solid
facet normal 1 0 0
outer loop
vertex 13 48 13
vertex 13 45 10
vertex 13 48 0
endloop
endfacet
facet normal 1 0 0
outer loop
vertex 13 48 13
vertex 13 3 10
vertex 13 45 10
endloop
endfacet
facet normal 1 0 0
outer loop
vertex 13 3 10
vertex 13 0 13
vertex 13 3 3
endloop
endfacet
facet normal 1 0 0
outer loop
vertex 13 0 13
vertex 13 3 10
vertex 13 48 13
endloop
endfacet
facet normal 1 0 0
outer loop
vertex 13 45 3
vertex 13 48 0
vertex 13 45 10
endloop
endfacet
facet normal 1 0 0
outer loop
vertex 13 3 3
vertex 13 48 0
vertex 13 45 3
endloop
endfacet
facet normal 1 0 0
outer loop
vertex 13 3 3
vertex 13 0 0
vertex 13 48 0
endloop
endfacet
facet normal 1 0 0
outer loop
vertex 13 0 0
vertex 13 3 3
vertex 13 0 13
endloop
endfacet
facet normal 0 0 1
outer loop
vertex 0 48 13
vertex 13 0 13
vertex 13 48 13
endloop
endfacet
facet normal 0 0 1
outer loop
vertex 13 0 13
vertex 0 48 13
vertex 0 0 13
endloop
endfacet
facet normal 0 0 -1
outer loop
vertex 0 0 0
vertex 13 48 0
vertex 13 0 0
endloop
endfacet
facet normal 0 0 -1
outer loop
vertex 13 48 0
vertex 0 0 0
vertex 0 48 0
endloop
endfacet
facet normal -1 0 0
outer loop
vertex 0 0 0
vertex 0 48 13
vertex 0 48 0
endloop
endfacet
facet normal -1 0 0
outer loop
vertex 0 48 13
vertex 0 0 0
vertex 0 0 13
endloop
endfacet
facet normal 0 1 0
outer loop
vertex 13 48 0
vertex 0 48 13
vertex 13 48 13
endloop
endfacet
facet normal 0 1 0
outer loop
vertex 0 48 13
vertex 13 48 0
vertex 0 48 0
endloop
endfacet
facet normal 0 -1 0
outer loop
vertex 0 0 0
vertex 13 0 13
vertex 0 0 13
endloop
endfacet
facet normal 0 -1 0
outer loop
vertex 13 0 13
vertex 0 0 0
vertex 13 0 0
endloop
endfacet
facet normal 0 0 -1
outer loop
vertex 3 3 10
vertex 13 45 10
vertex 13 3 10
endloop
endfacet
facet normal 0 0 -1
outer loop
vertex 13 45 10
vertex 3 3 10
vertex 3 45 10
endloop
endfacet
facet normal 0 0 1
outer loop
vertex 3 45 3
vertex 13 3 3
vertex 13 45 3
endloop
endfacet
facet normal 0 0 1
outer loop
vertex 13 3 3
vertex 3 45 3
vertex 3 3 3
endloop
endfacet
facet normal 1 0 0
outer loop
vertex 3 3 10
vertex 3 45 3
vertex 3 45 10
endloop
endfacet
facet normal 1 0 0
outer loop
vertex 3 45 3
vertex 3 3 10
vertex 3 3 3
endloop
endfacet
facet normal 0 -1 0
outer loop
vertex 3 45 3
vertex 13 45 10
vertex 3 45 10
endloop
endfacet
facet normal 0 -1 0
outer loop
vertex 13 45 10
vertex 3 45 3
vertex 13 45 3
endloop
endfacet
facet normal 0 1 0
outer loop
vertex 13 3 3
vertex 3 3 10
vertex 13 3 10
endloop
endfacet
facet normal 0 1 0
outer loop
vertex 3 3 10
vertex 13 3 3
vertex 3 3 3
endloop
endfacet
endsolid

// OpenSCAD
//
//
//

$clipW = 42;
$clipH =  7;
$clipD = 10;
$wall  =  3;

$h = $clipH + 2 * $wall;
$w = $clipW + 2 * $wall;
$d = $clipD + $wall;

difference() {
    cube( [ $d, $w, $h ]);

    translate( [ $wall, $wall, $wall ] ) {
        cube( [ $clipD, $clipW, $clipH ]);
    };
};
